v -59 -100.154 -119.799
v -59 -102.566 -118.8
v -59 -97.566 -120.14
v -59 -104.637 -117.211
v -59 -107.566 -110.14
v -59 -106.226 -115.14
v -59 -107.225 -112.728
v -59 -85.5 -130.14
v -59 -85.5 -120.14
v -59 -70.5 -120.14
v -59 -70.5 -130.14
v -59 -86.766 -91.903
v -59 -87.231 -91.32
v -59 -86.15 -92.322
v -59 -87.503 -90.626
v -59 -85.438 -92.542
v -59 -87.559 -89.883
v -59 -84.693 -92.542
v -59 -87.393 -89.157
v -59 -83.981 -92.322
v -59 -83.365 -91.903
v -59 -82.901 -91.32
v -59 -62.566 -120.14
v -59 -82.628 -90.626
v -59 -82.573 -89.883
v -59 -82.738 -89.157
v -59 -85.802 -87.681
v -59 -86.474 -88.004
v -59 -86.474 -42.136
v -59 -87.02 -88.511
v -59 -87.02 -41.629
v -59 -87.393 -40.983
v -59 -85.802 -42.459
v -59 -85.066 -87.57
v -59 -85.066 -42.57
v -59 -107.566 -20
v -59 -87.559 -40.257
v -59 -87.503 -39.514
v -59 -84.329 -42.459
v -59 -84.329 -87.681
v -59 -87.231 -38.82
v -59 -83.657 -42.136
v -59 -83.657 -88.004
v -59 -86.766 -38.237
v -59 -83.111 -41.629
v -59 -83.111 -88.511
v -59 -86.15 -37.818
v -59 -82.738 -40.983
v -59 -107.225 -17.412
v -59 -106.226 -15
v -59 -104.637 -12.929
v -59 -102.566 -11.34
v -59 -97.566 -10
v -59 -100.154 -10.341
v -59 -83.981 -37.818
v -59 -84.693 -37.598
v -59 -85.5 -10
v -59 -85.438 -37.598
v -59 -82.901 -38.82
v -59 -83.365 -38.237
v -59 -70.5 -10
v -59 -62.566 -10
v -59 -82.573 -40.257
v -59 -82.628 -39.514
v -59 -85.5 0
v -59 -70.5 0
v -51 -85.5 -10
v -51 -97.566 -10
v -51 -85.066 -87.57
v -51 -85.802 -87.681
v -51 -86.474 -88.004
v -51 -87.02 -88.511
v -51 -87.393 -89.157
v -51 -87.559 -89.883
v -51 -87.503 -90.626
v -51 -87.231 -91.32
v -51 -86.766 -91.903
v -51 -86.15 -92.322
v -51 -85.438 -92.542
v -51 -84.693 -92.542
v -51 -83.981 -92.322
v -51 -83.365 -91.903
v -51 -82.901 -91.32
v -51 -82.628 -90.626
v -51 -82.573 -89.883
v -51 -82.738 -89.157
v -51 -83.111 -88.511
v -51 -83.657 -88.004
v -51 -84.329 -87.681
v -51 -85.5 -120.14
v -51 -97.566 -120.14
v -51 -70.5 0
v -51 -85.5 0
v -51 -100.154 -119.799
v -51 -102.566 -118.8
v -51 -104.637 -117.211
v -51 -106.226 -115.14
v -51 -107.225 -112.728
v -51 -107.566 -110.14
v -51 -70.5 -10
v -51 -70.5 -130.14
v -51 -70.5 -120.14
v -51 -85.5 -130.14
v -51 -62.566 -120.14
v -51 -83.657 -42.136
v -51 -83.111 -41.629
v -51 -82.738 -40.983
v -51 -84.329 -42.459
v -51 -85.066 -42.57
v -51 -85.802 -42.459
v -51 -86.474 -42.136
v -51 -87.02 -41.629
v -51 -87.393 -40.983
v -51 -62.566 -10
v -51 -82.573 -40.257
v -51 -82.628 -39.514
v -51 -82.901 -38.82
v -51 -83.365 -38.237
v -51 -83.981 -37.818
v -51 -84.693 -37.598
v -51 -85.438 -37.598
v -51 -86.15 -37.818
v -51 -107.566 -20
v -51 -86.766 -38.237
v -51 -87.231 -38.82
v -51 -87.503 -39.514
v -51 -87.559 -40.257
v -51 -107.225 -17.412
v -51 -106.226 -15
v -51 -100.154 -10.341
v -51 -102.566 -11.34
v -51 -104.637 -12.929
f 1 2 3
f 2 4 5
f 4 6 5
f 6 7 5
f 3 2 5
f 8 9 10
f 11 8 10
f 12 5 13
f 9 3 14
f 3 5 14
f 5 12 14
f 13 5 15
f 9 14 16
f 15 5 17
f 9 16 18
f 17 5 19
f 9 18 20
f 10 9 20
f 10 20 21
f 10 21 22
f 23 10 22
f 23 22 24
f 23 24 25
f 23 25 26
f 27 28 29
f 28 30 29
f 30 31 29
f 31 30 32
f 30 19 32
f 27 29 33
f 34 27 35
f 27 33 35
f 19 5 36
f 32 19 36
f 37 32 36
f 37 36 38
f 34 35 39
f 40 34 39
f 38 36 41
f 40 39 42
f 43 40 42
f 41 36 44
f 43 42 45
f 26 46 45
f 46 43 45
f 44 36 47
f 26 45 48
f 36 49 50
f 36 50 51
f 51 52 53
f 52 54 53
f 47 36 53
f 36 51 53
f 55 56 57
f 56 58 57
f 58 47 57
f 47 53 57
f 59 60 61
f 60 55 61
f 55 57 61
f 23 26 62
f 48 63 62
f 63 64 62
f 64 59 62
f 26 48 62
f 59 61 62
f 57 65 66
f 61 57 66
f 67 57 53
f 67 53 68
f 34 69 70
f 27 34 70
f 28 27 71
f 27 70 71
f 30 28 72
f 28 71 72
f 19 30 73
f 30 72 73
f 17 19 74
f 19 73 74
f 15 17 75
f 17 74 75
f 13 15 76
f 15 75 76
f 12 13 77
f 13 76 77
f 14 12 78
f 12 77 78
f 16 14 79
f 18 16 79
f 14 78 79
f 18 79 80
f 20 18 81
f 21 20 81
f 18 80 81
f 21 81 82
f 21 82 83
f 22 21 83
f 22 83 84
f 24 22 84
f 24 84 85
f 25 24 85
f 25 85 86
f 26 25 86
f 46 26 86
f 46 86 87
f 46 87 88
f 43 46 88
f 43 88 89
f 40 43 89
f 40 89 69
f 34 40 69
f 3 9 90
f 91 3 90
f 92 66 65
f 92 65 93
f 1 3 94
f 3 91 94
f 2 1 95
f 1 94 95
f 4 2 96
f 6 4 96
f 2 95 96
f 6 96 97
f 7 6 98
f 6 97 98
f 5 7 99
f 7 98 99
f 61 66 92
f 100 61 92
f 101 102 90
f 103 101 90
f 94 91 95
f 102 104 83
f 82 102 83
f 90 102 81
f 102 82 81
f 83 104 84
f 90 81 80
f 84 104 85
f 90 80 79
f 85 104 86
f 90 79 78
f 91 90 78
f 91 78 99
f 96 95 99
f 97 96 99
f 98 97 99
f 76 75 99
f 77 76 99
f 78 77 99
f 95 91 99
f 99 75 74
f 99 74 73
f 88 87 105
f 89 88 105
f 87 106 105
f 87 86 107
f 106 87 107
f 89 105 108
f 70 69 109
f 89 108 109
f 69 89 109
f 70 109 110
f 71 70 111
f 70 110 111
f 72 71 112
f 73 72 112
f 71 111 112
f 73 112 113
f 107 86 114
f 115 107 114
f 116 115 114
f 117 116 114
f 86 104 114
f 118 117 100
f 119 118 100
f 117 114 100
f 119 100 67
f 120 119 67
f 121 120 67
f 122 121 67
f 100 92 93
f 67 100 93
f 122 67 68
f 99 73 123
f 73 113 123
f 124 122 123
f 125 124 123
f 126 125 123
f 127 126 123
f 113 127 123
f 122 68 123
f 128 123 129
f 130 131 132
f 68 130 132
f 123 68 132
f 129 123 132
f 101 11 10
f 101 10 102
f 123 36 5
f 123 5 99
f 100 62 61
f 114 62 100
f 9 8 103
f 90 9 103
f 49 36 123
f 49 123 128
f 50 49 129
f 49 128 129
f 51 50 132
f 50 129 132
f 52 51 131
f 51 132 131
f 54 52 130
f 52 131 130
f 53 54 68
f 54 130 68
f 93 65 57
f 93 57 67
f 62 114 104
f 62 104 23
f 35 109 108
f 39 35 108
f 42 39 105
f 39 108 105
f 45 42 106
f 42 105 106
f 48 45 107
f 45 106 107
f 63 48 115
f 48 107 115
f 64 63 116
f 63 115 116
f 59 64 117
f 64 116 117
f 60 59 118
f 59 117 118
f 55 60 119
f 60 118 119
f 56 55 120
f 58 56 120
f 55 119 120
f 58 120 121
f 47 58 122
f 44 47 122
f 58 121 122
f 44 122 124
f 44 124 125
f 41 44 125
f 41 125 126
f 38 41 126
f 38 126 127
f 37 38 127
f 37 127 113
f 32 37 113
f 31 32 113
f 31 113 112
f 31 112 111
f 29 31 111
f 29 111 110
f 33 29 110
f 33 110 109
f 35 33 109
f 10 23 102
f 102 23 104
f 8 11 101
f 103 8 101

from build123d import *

# Parameters (mm, degrees)
SKETCH1_W           = 8
SKETCH1_H           = 15
BOSS_EXTRUDE1_DEPTH = 10
BOSS_EXTRUDE2_DEPTH = 110.14
FILLET1_R           = 10
SKETCH4_R           = 2.5
CUT_EXTRUDE1_DEPTH  = 10


with BuildPart() as part:
    # Sketch1 → Boss-Extrude1 (new body)
    with BuildSketch(Plane.XY):
        with Locations((-55, -78)):
            Rectangle(SKETCH1_W, SKETCH1_H)
    boss_extrude1 = extrude(amount=-BOSS_EXTRUDE1_DEPTH)

    # Sketch2 → Boss-Extrude2 (add)
    with BuildSketch(Plane(origin=(0, 0, -10), x_dir=(-1, 0, 0), z_dir=(0, 0, -1))):
        Polygon((51, -62.565581077), (59, -62.565581077), (59, -92.565581077), (59, -107.565581077), (51, -107.565581077), (51, -92.565581077), align=None)
    extrude(amount=BOSS_EXTRUDE2_DEPTH)

    # Fillet1
    fillet1_edges = [part.edges().sort_by_distance(p)[0] for p in [
        (-55, -107.565581077, -120.14),
        (-55, -107.565581077, -10),
    ]]
    fillet(fillet1_edges, radius=FILLET1_R)

    # Mirror1: Boss-Extrude1 across plane
    add(boss_extrude1.mirror(Plane.XY.offset(-65.07)))

    # Sketch4 → Cut-Extrude1 (cut)
    with BuildSketch(Plane(origin=(-51, 0, 0), x_dir=(0, 0, -1), z_dir=(1, 0, 0))):
        with Locations((40.07, -85.065581077)):
            Circle(SKETCH4_R)
        with Locations(Location((90.07, -85.065581077, 0), (0, 0, 180))):
            Circle(SKETCH4_R)
    extrude(amount=-CUT_EXTRUDE1_DEPTH, mode=Mode.SUBTRACT)


solid = part.part
